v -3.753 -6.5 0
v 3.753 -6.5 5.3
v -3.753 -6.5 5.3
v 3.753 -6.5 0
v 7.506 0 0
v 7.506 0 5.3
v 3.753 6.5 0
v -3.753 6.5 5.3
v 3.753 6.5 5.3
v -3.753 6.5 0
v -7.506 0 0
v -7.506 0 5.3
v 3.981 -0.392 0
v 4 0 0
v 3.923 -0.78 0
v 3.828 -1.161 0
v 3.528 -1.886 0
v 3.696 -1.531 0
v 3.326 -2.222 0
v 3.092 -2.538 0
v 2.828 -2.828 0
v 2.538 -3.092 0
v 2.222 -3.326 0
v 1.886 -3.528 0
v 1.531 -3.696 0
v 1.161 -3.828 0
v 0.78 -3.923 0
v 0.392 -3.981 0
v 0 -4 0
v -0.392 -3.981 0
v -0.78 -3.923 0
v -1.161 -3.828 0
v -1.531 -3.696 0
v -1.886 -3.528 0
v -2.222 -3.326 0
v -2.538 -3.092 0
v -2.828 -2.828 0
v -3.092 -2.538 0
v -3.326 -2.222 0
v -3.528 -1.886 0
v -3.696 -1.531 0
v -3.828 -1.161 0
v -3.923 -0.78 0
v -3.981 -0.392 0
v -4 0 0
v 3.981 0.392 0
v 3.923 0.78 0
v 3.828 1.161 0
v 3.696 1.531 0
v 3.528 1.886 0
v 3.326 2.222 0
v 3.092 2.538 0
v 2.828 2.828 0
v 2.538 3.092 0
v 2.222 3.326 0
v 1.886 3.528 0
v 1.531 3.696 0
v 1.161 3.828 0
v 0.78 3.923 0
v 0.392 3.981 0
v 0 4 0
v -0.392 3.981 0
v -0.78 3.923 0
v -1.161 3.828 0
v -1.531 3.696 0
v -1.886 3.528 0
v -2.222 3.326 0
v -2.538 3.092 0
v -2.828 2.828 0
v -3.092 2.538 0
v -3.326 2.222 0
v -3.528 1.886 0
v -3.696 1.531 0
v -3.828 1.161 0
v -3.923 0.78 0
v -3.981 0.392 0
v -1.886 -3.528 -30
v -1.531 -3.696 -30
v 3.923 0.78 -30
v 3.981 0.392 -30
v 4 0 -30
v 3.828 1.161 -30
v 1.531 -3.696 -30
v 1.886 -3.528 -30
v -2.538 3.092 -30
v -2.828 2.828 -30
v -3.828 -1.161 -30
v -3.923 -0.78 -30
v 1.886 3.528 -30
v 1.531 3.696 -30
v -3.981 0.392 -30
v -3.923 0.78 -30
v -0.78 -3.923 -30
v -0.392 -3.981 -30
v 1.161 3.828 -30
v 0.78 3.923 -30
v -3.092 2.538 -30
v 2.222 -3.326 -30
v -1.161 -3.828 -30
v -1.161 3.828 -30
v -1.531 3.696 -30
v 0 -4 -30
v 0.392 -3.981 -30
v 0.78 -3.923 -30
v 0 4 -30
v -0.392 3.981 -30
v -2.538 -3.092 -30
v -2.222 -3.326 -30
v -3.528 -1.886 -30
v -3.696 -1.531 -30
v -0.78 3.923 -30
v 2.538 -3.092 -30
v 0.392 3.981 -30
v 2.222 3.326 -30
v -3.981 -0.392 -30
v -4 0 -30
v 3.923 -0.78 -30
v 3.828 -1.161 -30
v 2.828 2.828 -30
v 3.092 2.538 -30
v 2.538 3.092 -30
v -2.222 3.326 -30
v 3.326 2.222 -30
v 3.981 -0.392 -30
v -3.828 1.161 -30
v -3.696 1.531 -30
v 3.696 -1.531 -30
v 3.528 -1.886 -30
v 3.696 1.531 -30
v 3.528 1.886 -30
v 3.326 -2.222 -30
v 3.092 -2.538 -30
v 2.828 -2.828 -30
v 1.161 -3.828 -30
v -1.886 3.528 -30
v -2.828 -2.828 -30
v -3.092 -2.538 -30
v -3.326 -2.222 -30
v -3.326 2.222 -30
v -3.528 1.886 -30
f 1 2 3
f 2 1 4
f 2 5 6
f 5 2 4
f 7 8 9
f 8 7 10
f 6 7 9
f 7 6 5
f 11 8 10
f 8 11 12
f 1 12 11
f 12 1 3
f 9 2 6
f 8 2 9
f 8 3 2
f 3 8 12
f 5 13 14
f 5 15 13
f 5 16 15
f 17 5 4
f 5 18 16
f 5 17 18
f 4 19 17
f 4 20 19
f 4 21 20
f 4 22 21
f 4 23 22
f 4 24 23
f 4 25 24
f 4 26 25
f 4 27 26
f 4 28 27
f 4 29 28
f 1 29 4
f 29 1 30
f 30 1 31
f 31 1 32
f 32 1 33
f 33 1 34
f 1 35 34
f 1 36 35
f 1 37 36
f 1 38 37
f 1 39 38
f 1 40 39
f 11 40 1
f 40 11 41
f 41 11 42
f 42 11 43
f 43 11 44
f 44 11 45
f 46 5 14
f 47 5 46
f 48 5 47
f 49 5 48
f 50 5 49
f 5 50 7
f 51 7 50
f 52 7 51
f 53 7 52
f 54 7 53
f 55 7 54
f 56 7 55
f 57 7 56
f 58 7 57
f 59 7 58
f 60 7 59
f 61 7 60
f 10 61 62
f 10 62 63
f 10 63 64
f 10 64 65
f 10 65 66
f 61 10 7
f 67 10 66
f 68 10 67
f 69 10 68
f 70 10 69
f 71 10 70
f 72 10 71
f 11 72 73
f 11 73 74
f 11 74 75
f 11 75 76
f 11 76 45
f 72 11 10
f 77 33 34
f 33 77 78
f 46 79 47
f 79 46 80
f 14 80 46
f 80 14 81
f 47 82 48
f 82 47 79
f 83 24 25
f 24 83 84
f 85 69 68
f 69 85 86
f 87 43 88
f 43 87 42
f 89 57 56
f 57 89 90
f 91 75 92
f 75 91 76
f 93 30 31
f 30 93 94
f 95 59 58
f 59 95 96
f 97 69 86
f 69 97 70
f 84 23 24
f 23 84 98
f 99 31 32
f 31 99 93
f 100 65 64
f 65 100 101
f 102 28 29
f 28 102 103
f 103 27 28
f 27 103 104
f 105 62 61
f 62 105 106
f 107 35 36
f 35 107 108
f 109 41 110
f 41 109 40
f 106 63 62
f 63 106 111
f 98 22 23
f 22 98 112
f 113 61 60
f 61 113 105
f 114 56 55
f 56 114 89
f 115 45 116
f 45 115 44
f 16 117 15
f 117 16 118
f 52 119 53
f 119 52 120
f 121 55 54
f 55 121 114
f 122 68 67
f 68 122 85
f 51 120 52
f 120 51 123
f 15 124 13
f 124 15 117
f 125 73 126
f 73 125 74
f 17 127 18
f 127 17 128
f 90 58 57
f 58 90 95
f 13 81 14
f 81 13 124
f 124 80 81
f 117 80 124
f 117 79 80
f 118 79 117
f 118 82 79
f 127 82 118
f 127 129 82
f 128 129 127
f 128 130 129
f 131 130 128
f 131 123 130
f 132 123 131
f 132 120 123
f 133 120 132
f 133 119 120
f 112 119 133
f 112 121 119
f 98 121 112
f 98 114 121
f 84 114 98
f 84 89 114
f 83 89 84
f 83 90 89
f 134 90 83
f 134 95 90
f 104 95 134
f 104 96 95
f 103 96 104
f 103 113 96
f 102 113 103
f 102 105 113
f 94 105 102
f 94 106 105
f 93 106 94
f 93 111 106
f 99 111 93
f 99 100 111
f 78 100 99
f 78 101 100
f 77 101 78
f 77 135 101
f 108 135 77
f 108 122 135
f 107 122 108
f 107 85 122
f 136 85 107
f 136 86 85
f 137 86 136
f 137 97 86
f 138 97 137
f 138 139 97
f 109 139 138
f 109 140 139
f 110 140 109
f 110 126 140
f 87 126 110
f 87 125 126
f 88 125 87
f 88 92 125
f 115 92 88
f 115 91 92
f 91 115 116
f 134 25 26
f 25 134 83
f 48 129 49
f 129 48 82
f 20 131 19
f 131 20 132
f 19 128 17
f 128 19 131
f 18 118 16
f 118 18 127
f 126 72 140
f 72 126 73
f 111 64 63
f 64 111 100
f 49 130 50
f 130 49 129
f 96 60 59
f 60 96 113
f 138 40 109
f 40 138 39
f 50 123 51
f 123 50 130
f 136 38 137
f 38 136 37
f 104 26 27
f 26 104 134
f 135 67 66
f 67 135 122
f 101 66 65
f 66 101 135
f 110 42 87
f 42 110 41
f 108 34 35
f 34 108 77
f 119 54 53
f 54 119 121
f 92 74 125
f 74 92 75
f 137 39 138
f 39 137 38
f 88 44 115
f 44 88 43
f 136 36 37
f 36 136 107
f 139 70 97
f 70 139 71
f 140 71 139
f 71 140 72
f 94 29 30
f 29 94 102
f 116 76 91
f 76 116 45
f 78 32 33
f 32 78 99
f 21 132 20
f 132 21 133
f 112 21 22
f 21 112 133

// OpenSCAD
$fn = 64;

across_flats = 13;
head_height = 5.3;
shank_diameter = 8;
shank_length = 30;

union() {
    // 六角ボルト頭部
    cylinder(
        h = head_height,
        r = across_flats / sqrt(3),
        $fn = 6,
        center = false
    );

    // シャンク
    translate([0, 0, -shank_length])
        cylinder(
            h = shank_length,
            d = shank_diameter,
            center = false
        );
}
